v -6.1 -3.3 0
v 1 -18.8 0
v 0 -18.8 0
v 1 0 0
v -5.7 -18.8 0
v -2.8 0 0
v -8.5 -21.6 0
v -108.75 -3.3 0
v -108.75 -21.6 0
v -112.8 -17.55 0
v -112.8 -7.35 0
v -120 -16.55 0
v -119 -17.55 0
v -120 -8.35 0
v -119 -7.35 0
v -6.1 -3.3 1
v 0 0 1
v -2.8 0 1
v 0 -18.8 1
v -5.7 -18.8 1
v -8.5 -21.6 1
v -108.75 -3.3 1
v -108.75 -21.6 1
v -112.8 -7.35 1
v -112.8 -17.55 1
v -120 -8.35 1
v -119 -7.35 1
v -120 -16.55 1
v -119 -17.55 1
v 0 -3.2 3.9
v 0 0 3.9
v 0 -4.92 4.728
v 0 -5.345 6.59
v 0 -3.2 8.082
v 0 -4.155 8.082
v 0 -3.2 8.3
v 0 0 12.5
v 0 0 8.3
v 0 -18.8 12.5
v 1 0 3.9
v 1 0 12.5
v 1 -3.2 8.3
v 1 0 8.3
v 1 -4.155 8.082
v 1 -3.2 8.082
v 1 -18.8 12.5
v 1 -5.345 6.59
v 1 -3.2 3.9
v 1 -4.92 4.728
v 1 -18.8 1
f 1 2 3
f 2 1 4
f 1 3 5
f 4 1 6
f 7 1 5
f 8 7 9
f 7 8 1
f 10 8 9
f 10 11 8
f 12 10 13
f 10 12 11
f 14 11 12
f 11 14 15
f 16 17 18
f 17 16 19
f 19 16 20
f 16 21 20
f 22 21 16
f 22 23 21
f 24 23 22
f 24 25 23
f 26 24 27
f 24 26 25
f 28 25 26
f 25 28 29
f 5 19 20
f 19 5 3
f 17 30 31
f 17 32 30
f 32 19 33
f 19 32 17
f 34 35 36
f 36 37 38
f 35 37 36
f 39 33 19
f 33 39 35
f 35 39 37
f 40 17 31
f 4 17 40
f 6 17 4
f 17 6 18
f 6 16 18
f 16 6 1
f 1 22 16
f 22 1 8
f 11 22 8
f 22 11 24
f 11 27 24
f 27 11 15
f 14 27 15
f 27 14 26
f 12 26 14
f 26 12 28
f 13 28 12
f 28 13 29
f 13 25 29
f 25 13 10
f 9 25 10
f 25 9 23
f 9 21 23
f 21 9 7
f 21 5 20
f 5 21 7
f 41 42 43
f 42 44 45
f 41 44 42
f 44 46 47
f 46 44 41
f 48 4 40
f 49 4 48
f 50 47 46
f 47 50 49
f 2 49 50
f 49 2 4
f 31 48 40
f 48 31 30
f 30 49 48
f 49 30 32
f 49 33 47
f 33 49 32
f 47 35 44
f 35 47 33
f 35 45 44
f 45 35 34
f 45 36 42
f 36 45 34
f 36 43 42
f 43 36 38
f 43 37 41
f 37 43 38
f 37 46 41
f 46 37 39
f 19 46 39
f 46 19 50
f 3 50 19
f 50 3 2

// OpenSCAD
// PC case Finger (slot cover)
// Author: JayEye <jayeye@gmail.com>
//
// For the latest version, look in
// https://github.com/jayeye/jum/tree/master/src/scad/finger
//
// The following dimensions are taken from
// http://www.lo-tech.co.uk/w/images/0/0b/RAM-and-EMS-Board-Slot-Bracket-r01.png
// All distances are in millimeters.
//
//
// Body, looking from the outside.
//                                                        B.-----.A
//                                                        /      |
//                                                       /       |
//            D.-------------------//-------------------'C       |
//            /                                                  |
//  F.-------'E                                                  |
//   |                                                           |
//   |                                                           |
//  G`-------.H                                          K.------'L
//            \                                          /
//            I`-------------------//-------------------'J
//
// Horizontal distances:
// AB: 2.8
// AC: 6.1
// AG: 120
// AH: 112.8
// AJ: 8.5
// AK: 5.7
//
// Vertical distances:
// AL: 18.8
// LJ: 2.8
// FG: 10.2
// JD: 18.3

module finger_front() {
  u = (18.3 - 10.2) / 2;

  A = [0, 0];
  B = A + [-2.8, 0];
  L = A + [0, -18.8];
  K = L + [-5.7, 0];
  J = [-8.5, K[1] - 2.8];
  H = [-112.8, J[1] + u];
  I = [H[0] + u, J[1]];
  G = [-120, H[1]];
  F = G + [0, 10.2];
  E = [H[0], F[1]];
  D = [I[0], J[1] + 18.3];
  C = A + [-6.1, D[1]];
  B = A + [-2.8, 0];

  Fa = F + [0, -1]; // chamfer the corners!
  Fb = F + [1, 0];

  Ga = G + [0, 1];
  Gb = G + [1, 0];

  polygon(points=[A, B, C, D, E, Fb, Fa, Ga, Gb, H, I, J, K, L],
          paths=[[0, 1, 2, 3, 4, 5, 6, 7, 8, 9, 10, 11, 12, 13]]);
}


// Tab, looking from above:
//
//  P.------.Q   V.---.M
//   |      |     |   |
//   |      |     |   |
//   |      R  S  T   |
//   |       \___/    |
//   |                |
//   |                |
//   |                |
//   |                |
//  O`----------------'N
//
// 
// Horizontal distances:
// PS: 6.4
// ON: 11.5
// QV: 4.4
//
// Vertical distances:
// MS: 3.2
// MN: 18.8
//
// S is the center of a semicircle.

module finger_top() {
  r = 4.4 / 2;

  M = [0, 0];
  N = M + [0, -18.8];
  O = N + [-11.5, 0];
  P = [O[0], 0];
  S = P + [6.4, -3.2];
  R = S + [-r, 0];
  T = S + [r, 0];
  Q = [R[0], 0];
  V = [T[0], 0];

  difference() {
    polygon(points=[M, N, O, P, Q, R, T, V],
            paths=[[0, 1, 2, 3, 4, 5, 6, 7]]);
    translate(S) circle(r=r);
  }
}

module finger_full(finger_thickness=1) {
  color("cyan")
    linear_extrude(height=finger_thickness) 
      finger_front();
  color("magenta")
    translate([0, 0, finger_thickness])
      rotate(90, [0, 1, 0])
        linear_extrude(height=finger_thickness)
          finger_top();
  color("yellow")
    scale([1, -1, 1])
      cube([finger_thickness, 18.8, finger_thickness]);
}

finger_full();
